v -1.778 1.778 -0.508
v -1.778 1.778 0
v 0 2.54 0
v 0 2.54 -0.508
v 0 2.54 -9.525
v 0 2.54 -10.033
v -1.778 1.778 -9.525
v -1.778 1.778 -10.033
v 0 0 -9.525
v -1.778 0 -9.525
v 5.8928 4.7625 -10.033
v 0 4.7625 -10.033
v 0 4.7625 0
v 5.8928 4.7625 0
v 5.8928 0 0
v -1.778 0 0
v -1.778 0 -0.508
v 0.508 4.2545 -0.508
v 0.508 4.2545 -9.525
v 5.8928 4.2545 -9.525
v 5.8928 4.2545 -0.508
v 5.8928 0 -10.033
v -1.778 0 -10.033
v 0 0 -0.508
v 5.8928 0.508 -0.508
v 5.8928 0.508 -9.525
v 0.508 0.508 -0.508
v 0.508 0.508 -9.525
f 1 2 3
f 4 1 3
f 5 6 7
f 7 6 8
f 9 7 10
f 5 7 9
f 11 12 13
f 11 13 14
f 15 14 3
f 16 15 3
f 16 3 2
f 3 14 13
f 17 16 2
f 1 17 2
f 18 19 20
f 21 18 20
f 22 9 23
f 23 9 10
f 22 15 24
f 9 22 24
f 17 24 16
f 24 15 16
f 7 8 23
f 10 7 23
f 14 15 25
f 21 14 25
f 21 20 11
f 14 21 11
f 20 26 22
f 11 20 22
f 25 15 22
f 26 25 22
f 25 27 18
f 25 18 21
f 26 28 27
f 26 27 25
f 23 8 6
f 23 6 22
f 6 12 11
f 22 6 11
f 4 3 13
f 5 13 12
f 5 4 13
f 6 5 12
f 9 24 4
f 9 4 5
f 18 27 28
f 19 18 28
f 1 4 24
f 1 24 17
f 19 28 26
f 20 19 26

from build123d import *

# Parameters (mm, degrees)
SKETCH1_W           = 5.8928
SKETCH1_H           = 10.033
BOSS_EXTRUDE1_DEPTH = 4.7625
SHELL3_T            = -0.508
BOSS_EXTRUDE2_DEPTH = 0.508
BOSS_EXTRUDE3_DEPTH = 0.508


with BuildPart() as part:
    # Sketch1 → Boss-Extrude1 (new body)
    with BuildSketch(Plane(origin=(0, 0, 0), x_dir=(1, 0, 0), z_dir=(0, 1, 0))):
        with Locations((2.9464, 5.0165)):
            Rectangle(SKETCH1_W, SKETCH1_H)
    extrude(amount=BOSS_EXTRUDE1_DEPTH)

    # Shell3
    shell3_openings = [part.faces().sort_by_distance(p)[0] for p in [
        (5.8928, 2.38125, -5.0165),
    ]]
    offset(amount=SHELL3_T, openings=shell3_openings, kind=Kind.INTERSECTION)

    # Sketch2 → Boss-Extrude2 (add)
    with BuildSketch(Plane.XY):
        Polygon((-1.778, 1.778), (0, 2.54), (0, 0), (-1.778, 0), align=None)
    extrude(amount=-BOSS_EXTRUDE2_DEPTH)

    # Sketch3 → Boss-Extrude3 (add)
    with BuildSketch(Plane(origin=(0, 0, -10.033), x_dir=(-1, 0, 0), z_dir=(0, 0, -1))):
        Polygon((0, 2.54), (1.778, 1.778), (1.778, 0), (0, 0), (0, 1.778), align=None)
    extrude(amount=-BOSS_EXTRUDE3_DEPTH)


solid = part.part
